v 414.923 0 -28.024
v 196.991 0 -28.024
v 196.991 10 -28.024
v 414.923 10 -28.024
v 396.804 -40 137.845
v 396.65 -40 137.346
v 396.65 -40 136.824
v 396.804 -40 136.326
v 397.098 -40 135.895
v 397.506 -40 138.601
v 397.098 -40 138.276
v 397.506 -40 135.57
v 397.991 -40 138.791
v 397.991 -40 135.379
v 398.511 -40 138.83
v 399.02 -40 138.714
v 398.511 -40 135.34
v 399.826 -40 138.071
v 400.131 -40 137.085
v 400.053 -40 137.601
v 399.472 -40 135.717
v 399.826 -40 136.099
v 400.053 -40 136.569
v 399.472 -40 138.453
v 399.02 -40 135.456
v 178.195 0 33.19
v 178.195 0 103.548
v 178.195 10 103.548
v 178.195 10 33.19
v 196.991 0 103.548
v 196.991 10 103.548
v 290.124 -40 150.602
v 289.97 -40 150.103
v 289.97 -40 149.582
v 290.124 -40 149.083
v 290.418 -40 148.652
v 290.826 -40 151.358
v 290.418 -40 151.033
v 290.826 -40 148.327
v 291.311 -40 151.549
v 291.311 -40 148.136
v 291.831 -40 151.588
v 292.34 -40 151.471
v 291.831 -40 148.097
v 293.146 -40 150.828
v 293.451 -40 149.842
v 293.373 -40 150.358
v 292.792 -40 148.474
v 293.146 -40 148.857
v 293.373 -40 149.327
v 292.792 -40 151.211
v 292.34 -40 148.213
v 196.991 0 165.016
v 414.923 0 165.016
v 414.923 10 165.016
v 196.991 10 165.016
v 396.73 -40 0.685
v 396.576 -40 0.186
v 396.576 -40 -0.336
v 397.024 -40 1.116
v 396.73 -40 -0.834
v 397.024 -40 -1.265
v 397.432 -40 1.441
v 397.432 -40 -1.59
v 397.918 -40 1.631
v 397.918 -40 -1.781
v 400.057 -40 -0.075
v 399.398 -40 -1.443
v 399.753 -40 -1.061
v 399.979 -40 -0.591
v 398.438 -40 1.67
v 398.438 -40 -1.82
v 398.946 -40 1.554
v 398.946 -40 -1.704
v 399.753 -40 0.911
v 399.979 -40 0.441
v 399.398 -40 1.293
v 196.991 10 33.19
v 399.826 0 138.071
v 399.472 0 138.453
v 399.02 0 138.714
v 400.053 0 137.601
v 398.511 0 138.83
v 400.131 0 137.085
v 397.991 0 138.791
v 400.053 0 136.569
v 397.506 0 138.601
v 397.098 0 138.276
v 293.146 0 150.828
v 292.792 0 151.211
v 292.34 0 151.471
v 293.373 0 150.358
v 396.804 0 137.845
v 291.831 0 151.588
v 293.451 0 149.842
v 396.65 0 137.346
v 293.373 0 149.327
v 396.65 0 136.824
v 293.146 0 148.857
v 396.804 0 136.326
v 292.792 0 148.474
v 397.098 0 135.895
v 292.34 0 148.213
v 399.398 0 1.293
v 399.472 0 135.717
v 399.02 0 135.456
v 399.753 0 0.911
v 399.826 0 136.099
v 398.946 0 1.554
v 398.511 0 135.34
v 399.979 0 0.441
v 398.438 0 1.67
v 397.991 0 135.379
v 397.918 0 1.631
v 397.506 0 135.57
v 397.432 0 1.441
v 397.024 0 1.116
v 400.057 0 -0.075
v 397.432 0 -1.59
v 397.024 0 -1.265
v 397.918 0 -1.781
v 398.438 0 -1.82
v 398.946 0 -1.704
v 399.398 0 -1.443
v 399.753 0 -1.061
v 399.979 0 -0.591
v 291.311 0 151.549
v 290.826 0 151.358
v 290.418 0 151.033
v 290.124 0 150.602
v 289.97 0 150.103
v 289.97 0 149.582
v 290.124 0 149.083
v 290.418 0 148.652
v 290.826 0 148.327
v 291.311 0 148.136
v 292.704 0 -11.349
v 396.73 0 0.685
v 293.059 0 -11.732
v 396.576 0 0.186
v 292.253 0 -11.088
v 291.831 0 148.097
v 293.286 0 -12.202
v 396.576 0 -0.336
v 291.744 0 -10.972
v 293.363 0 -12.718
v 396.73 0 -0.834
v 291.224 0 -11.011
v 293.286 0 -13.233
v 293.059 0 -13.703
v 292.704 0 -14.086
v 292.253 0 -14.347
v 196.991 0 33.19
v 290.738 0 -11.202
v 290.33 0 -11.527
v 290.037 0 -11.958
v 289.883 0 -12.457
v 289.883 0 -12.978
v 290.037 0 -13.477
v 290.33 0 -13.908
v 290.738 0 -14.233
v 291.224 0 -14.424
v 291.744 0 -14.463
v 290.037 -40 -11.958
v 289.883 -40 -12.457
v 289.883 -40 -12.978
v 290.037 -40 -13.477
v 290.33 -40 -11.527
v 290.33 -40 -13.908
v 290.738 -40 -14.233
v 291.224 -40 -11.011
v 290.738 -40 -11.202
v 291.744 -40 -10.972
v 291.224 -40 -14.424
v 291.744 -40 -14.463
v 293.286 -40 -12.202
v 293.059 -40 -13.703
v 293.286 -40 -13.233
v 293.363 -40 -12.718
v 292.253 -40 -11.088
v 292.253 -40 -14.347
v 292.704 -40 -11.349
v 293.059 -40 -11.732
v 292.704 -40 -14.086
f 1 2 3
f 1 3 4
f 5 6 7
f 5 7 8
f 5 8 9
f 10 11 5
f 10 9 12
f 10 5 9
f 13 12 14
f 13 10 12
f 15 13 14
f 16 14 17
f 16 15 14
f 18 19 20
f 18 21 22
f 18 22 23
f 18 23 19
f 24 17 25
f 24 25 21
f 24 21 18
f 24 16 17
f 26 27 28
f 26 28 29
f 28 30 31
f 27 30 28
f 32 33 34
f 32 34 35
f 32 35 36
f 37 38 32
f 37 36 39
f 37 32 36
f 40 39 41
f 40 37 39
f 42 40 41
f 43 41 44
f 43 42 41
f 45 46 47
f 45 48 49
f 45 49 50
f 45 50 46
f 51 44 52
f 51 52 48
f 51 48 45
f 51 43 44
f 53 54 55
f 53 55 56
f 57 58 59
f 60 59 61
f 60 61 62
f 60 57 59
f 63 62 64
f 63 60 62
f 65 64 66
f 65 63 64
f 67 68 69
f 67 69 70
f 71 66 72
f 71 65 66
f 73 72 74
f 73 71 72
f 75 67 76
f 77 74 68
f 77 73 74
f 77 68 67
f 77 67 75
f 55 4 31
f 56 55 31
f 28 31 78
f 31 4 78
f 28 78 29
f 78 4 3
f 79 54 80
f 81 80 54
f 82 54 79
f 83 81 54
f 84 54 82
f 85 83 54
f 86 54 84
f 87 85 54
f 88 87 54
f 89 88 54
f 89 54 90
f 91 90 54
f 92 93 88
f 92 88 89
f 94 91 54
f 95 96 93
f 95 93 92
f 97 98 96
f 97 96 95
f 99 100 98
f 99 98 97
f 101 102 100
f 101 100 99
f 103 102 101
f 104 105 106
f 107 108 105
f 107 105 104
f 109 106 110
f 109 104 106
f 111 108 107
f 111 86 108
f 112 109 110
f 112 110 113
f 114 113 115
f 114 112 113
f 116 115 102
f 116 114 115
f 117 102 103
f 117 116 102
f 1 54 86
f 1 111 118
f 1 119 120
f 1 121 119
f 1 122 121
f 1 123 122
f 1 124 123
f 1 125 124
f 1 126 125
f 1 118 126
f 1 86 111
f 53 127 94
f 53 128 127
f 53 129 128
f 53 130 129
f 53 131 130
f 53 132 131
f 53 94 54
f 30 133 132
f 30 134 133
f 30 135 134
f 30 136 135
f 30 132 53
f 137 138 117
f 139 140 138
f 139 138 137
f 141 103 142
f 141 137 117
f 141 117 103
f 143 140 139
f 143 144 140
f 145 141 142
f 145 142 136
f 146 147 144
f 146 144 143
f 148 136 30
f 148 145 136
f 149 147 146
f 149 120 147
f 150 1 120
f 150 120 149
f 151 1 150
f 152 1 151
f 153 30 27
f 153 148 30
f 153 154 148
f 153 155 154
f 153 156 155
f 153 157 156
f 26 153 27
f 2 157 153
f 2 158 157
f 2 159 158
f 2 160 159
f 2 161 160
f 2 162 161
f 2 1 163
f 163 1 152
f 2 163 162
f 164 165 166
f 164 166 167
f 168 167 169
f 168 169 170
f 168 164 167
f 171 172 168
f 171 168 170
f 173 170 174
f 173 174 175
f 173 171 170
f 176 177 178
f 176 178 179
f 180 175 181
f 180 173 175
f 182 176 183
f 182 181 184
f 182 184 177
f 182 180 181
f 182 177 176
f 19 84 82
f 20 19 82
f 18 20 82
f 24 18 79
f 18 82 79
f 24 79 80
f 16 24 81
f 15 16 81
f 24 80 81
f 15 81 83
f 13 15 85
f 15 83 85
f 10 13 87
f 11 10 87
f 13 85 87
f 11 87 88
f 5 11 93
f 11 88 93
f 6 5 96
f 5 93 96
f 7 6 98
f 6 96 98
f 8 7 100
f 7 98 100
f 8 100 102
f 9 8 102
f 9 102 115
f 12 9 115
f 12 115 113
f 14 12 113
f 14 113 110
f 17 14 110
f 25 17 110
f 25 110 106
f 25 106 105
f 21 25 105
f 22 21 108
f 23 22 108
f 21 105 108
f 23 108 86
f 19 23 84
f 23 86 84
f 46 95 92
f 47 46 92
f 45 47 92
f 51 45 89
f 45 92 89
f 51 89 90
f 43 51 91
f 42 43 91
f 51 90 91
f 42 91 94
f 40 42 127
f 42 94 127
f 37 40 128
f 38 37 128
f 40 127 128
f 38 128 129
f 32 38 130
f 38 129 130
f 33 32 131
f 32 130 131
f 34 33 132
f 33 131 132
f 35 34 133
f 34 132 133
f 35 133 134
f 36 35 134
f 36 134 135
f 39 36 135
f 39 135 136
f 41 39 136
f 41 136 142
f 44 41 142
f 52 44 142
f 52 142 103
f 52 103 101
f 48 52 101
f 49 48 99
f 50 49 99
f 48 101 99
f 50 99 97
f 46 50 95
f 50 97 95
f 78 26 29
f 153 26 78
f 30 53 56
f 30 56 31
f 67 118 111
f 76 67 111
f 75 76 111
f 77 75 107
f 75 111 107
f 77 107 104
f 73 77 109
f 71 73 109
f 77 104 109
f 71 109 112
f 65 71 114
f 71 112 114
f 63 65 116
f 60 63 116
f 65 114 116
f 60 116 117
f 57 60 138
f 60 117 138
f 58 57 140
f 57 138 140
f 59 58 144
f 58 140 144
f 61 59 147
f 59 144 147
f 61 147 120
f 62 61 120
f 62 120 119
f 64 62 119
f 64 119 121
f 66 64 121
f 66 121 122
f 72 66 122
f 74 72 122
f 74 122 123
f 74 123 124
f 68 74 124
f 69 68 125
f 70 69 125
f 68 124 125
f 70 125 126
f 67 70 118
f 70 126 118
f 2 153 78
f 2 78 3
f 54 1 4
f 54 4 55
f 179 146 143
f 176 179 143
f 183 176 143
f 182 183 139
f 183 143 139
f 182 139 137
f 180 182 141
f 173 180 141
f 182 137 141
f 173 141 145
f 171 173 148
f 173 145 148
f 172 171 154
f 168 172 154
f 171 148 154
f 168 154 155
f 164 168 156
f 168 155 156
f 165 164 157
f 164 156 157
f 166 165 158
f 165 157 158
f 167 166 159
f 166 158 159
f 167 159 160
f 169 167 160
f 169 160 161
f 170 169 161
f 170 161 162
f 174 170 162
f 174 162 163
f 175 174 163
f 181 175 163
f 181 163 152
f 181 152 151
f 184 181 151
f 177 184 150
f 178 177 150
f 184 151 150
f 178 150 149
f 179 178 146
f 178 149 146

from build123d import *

# Parameters (mm, degrees)
BOSS_EXTRUDE1_DEPTH = 10
SKETCH2_R           = 1.75
BOSS_EXTRUDE2_DEPTH = 40


with BuildPart() as part:
    # Sketch1 → Boss-Extrude1 (new body)
    with BuildSketch(Plane(origin=(0, 0, 0), x_dir=(1, 0, 0), z_dir=(0, 1, 0))):
        Polygon((196.990512748, 28.023652023), (414.922512748, 28.023652023), (414.922512748, -165.016347977), (196.990512748, -165.016347977), (196.990512748, -103.548347977), (178.194512748, -103.548347977), (178.194512748, -33.190347977), (196.990512748, -33.190347977), align=None)
    extrude(amount=BOSS_EXTRUDE1_DEPTH)

    # Sketch2 → Boss-Extrude2 (add)
    with BuildSketch(Plane.XZ):
        with Locations((291.700512748, 149.842465897)):
            Circle(SKETCH2_R)
        with Locations((398.380512748, 137.085232309)):
            Circle(SKETCH2_R)
        with Locations((398.306929068, -0.074747953)):
            Circle(SKETCH2_R)
        with Locations((291.61330246, -12.71751071)):
            Circle(SKETCH2_R)
    extrude(amount=BOSS_EXTRUDE2_DEPTH)


solid = part.part
